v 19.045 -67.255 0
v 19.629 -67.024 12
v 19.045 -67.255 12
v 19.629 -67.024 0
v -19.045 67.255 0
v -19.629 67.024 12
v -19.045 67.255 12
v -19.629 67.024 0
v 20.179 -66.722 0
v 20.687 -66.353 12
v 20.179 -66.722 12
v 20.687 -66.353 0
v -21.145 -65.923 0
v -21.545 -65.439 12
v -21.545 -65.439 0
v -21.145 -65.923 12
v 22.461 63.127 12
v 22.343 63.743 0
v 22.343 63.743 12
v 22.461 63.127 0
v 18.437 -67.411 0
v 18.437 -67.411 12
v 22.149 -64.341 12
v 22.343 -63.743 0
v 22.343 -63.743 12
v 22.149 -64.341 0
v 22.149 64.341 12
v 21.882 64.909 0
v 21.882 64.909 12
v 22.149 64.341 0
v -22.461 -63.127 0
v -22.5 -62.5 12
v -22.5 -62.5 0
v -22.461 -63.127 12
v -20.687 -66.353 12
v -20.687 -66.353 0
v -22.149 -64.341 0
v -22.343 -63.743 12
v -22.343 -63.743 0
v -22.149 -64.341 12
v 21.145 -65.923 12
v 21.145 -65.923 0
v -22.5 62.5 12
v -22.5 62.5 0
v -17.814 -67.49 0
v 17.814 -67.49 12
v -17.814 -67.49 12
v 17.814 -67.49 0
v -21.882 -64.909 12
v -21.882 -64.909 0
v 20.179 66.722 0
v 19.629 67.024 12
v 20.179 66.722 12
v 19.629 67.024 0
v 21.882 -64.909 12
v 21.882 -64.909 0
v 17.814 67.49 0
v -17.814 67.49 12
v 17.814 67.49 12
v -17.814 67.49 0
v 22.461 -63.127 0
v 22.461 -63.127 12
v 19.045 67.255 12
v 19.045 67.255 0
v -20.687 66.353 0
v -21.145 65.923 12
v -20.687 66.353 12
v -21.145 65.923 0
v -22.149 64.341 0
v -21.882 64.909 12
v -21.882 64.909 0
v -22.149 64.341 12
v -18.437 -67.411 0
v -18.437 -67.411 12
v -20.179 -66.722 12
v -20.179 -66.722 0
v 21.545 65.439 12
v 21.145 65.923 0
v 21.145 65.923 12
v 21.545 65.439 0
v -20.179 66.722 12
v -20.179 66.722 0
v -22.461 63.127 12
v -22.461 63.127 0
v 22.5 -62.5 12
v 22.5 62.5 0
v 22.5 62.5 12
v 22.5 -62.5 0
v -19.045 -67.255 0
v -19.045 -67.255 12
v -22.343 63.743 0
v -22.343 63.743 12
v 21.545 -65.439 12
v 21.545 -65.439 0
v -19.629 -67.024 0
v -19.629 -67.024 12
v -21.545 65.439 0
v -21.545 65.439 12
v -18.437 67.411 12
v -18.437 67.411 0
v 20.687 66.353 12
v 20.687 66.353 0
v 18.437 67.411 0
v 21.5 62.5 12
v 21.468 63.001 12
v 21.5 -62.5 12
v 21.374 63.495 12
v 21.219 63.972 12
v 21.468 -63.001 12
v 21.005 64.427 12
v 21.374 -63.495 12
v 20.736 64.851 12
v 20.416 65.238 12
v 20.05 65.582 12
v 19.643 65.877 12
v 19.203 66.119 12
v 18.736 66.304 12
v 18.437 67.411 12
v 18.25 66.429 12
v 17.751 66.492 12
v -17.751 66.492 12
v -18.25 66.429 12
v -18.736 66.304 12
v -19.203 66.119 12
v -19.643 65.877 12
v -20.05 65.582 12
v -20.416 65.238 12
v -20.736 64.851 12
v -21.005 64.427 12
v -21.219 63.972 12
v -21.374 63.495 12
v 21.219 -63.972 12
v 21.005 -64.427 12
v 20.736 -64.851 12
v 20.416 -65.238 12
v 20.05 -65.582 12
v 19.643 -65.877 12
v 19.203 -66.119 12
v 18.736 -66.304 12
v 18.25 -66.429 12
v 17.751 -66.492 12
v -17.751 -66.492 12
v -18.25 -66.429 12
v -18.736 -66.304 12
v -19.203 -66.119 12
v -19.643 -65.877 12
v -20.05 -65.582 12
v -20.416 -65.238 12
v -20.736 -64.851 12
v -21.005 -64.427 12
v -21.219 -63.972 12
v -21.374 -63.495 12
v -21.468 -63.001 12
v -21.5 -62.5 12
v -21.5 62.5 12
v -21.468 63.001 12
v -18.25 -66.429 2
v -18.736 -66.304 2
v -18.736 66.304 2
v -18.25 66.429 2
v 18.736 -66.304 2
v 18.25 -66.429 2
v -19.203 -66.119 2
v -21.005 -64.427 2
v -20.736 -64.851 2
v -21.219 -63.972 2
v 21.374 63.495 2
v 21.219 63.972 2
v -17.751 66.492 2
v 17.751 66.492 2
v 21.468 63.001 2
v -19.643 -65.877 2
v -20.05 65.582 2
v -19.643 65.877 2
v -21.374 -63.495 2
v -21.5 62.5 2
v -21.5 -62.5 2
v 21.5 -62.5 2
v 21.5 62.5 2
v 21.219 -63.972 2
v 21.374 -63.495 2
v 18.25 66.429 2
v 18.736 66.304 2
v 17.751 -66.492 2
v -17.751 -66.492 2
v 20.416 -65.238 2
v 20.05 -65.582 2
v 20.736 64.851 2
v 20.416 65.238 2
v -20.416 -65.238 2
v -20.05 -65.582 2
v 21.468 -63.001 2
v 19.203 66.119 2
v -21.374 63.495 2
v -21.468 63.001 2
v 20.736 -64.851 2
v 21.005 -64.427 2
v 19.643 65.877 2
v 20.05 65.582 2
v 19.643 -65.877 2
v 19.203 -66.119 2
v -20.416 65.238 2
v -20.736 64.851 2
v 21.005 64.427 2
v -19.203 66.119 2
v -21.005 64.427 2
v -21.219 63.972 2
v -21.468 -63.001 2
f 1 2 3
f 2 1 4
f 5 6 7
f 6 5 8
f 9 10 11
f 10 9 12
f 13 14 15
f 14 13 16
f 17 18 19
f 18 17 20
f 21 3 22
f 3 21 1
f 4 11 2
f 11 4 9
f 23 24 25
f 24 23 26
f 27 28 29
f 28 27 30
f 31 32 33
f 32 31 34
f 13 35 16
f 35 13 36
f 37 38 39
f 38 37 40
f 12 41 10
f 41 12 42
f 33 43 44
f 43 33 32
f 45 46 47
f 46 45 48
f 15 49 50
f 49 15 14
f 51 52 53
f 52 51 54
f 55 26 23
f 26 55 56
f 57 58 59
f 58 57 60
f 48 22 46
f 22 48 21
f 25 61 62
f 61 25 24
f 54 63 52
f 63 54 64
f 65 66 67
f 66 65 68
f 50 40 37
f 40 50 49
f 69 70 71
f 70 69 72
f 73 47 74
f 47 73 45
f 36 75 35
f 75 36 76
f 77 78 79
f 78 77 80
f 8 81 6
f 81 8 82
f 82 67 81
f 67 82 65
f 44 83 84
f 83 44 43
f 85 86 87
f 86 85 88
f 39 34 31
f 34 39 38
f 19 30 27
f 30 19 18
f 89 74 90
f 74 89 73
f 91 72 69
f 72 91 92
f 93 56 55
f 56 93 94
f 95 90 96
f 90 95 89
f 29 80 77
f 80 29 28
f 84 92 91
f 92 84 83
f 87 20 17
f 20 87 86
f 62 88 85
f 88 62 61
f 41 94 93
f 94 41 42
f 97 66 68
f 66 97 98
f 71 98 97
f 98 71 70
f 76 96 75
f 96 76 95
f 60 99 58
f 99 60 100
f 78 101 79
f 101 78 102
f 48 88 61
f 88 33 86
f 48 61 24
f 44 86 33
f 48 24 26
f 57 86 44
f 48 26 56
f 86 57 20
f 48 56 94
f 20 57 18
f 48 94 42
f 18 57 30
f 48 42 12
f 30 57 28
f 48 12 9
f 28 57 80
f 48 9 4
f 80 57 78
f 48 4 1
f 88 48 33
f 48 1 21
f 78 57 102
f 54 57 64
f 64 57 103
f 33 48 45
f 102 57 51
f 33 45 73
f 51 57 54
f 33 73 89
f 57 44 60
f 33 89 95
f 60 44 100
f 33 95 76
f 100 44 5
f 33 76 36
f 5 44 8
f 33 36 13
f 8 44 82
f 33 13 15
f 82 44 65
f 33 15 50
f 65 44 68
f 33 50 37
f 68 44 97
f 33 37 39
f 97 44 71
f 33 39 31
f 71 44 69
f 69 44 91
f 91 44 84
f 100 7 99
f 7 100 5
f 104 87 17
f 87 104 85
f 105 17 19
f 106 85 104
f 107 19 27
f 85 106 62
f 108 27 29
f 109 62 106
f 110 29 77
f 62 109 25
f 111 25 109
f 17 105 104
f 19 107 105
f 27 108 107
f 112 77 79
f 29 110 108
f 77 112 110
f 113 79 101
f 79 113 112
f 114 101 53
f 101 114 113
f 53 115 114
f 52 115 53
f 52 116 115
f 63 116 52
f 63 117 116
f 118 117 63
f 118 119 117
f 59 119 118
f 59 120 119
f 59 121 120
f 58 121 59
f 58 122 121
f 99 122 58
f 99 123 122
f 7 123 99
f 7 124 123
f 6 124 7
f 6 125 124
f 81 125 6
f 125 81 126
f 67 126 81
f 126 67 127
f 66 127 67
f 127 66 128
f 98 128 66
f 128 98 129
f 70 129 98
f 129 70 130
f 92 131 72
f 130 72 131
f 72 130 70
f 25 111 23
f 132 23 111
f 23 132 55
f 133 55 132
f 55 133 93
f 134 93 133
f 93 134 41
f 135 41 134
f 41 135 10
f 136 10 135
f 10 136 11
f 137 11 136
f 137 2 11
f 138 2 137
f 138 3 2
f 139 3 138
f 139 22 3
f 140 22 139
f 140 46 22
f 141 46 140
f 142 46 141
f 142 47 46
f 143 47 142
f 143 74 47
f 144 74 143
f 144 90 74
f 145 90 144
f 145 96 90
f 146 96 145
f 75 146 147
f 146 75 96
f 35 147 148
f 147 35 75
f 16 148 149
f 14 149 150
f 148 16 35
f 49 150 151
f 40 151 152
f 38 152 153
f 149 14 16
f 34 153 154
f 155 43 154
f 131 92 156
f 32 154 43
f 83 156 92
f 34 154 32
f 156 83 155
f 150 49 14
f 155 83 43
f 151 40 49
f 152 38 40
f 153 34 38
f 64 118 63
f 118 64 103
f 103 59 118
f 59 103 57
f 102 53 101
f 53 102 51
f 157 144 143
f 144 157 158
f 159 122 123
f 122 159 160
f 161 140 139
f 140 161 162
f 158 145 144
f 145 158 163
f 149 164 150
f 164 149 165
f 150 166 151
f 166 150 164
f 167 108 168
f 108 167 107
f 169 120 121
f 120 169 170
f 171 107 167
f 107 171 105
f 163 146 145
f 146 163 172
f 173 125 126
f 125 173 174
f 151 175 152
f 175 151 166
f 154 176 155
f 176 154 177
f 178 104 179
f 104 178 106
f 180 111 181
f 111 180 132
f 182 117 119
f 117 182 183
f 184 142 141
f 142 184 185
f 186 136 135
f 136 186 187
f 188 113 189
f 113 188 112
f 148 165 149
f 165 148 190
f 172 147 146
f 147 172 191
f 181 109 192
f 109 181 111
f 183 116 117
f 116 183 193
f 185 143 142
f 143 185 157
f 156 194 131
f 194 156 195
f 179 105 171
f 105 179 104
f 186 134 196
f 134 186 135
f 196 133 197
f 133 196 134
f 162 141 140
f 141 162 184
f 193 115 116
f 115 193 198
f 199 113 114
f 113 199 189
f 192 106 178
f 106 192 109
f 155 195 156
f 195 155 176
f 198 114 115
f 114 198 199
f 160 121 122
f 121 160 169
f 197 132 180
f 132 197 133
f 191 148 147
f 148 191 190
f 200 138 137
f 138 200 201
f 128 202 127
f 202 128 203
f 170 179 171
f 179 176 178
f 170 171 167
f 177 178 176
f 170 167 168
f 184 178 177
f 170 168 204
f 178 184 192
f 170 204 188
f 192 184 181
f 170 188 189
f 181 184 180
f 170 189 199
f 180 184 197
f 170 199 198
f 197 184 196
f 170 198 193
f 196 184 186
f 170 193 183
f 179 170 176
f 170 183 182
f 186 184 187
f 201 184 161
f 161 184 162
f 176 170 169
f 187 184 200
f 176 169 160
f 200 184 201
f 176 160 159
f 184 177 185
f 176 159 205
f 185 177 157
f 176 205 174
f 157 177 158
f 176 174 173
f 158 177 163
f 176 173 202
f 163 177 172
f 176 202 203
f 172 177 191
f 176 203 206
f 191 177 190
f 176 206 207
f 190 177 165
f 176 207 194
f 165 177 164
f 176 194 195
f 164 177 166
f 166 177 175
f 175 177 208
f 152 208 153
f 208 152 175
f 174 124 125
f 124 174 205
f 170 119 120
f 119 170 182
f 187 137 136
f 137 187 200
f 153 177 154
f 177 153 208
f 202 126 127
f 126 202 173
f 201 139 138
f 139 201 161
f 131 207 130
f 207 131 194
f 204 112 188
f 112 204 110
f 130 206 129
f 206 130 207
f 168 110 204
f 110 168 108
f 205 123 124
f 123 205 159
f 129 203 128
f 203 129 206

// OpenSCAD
$fn = 50;


difference() {
	union() {
		hull() {
			translate(v = [-17.5000000000, 62.5000000000, 0]) {
				cylinder(h = 12, r = 5);
			}
			translate(v = [17.5000000000, 62.5000000000, 0]) {
				cylinder(h = 12, r = 5);
			}
			translate(v = [-17.5000000000, -62.5000000000, 0]) {
				cylinder(h = 12, r = 5);
			}
			translate(v = [17.5000000000, -62.5000000000, 0]) {
				cylinder(h = 12, r = 5);
			}
		}
	}
	union() {
		translate(v = [0, 0, 2]) {
			hull() {
				translate(v = [-17.5000000000, 62.5000000000, 0]) {
					cylinder(h = 10, r = 4);
				}
				translate(v = [17.5000000000, 62.5000000000, 0]) {
					cylinder(h = 10, r = 4);
				}
				translate(v = [-17.5000000000, -62.5000000000, 0]) {
					cylinder(h = 10, r = 4);
				}
				translate(v = [17.5000000000, -62.5000000000, 0]) {
					cylinder(h = 10, r = 4);
				}
			}
		}
	}
}
